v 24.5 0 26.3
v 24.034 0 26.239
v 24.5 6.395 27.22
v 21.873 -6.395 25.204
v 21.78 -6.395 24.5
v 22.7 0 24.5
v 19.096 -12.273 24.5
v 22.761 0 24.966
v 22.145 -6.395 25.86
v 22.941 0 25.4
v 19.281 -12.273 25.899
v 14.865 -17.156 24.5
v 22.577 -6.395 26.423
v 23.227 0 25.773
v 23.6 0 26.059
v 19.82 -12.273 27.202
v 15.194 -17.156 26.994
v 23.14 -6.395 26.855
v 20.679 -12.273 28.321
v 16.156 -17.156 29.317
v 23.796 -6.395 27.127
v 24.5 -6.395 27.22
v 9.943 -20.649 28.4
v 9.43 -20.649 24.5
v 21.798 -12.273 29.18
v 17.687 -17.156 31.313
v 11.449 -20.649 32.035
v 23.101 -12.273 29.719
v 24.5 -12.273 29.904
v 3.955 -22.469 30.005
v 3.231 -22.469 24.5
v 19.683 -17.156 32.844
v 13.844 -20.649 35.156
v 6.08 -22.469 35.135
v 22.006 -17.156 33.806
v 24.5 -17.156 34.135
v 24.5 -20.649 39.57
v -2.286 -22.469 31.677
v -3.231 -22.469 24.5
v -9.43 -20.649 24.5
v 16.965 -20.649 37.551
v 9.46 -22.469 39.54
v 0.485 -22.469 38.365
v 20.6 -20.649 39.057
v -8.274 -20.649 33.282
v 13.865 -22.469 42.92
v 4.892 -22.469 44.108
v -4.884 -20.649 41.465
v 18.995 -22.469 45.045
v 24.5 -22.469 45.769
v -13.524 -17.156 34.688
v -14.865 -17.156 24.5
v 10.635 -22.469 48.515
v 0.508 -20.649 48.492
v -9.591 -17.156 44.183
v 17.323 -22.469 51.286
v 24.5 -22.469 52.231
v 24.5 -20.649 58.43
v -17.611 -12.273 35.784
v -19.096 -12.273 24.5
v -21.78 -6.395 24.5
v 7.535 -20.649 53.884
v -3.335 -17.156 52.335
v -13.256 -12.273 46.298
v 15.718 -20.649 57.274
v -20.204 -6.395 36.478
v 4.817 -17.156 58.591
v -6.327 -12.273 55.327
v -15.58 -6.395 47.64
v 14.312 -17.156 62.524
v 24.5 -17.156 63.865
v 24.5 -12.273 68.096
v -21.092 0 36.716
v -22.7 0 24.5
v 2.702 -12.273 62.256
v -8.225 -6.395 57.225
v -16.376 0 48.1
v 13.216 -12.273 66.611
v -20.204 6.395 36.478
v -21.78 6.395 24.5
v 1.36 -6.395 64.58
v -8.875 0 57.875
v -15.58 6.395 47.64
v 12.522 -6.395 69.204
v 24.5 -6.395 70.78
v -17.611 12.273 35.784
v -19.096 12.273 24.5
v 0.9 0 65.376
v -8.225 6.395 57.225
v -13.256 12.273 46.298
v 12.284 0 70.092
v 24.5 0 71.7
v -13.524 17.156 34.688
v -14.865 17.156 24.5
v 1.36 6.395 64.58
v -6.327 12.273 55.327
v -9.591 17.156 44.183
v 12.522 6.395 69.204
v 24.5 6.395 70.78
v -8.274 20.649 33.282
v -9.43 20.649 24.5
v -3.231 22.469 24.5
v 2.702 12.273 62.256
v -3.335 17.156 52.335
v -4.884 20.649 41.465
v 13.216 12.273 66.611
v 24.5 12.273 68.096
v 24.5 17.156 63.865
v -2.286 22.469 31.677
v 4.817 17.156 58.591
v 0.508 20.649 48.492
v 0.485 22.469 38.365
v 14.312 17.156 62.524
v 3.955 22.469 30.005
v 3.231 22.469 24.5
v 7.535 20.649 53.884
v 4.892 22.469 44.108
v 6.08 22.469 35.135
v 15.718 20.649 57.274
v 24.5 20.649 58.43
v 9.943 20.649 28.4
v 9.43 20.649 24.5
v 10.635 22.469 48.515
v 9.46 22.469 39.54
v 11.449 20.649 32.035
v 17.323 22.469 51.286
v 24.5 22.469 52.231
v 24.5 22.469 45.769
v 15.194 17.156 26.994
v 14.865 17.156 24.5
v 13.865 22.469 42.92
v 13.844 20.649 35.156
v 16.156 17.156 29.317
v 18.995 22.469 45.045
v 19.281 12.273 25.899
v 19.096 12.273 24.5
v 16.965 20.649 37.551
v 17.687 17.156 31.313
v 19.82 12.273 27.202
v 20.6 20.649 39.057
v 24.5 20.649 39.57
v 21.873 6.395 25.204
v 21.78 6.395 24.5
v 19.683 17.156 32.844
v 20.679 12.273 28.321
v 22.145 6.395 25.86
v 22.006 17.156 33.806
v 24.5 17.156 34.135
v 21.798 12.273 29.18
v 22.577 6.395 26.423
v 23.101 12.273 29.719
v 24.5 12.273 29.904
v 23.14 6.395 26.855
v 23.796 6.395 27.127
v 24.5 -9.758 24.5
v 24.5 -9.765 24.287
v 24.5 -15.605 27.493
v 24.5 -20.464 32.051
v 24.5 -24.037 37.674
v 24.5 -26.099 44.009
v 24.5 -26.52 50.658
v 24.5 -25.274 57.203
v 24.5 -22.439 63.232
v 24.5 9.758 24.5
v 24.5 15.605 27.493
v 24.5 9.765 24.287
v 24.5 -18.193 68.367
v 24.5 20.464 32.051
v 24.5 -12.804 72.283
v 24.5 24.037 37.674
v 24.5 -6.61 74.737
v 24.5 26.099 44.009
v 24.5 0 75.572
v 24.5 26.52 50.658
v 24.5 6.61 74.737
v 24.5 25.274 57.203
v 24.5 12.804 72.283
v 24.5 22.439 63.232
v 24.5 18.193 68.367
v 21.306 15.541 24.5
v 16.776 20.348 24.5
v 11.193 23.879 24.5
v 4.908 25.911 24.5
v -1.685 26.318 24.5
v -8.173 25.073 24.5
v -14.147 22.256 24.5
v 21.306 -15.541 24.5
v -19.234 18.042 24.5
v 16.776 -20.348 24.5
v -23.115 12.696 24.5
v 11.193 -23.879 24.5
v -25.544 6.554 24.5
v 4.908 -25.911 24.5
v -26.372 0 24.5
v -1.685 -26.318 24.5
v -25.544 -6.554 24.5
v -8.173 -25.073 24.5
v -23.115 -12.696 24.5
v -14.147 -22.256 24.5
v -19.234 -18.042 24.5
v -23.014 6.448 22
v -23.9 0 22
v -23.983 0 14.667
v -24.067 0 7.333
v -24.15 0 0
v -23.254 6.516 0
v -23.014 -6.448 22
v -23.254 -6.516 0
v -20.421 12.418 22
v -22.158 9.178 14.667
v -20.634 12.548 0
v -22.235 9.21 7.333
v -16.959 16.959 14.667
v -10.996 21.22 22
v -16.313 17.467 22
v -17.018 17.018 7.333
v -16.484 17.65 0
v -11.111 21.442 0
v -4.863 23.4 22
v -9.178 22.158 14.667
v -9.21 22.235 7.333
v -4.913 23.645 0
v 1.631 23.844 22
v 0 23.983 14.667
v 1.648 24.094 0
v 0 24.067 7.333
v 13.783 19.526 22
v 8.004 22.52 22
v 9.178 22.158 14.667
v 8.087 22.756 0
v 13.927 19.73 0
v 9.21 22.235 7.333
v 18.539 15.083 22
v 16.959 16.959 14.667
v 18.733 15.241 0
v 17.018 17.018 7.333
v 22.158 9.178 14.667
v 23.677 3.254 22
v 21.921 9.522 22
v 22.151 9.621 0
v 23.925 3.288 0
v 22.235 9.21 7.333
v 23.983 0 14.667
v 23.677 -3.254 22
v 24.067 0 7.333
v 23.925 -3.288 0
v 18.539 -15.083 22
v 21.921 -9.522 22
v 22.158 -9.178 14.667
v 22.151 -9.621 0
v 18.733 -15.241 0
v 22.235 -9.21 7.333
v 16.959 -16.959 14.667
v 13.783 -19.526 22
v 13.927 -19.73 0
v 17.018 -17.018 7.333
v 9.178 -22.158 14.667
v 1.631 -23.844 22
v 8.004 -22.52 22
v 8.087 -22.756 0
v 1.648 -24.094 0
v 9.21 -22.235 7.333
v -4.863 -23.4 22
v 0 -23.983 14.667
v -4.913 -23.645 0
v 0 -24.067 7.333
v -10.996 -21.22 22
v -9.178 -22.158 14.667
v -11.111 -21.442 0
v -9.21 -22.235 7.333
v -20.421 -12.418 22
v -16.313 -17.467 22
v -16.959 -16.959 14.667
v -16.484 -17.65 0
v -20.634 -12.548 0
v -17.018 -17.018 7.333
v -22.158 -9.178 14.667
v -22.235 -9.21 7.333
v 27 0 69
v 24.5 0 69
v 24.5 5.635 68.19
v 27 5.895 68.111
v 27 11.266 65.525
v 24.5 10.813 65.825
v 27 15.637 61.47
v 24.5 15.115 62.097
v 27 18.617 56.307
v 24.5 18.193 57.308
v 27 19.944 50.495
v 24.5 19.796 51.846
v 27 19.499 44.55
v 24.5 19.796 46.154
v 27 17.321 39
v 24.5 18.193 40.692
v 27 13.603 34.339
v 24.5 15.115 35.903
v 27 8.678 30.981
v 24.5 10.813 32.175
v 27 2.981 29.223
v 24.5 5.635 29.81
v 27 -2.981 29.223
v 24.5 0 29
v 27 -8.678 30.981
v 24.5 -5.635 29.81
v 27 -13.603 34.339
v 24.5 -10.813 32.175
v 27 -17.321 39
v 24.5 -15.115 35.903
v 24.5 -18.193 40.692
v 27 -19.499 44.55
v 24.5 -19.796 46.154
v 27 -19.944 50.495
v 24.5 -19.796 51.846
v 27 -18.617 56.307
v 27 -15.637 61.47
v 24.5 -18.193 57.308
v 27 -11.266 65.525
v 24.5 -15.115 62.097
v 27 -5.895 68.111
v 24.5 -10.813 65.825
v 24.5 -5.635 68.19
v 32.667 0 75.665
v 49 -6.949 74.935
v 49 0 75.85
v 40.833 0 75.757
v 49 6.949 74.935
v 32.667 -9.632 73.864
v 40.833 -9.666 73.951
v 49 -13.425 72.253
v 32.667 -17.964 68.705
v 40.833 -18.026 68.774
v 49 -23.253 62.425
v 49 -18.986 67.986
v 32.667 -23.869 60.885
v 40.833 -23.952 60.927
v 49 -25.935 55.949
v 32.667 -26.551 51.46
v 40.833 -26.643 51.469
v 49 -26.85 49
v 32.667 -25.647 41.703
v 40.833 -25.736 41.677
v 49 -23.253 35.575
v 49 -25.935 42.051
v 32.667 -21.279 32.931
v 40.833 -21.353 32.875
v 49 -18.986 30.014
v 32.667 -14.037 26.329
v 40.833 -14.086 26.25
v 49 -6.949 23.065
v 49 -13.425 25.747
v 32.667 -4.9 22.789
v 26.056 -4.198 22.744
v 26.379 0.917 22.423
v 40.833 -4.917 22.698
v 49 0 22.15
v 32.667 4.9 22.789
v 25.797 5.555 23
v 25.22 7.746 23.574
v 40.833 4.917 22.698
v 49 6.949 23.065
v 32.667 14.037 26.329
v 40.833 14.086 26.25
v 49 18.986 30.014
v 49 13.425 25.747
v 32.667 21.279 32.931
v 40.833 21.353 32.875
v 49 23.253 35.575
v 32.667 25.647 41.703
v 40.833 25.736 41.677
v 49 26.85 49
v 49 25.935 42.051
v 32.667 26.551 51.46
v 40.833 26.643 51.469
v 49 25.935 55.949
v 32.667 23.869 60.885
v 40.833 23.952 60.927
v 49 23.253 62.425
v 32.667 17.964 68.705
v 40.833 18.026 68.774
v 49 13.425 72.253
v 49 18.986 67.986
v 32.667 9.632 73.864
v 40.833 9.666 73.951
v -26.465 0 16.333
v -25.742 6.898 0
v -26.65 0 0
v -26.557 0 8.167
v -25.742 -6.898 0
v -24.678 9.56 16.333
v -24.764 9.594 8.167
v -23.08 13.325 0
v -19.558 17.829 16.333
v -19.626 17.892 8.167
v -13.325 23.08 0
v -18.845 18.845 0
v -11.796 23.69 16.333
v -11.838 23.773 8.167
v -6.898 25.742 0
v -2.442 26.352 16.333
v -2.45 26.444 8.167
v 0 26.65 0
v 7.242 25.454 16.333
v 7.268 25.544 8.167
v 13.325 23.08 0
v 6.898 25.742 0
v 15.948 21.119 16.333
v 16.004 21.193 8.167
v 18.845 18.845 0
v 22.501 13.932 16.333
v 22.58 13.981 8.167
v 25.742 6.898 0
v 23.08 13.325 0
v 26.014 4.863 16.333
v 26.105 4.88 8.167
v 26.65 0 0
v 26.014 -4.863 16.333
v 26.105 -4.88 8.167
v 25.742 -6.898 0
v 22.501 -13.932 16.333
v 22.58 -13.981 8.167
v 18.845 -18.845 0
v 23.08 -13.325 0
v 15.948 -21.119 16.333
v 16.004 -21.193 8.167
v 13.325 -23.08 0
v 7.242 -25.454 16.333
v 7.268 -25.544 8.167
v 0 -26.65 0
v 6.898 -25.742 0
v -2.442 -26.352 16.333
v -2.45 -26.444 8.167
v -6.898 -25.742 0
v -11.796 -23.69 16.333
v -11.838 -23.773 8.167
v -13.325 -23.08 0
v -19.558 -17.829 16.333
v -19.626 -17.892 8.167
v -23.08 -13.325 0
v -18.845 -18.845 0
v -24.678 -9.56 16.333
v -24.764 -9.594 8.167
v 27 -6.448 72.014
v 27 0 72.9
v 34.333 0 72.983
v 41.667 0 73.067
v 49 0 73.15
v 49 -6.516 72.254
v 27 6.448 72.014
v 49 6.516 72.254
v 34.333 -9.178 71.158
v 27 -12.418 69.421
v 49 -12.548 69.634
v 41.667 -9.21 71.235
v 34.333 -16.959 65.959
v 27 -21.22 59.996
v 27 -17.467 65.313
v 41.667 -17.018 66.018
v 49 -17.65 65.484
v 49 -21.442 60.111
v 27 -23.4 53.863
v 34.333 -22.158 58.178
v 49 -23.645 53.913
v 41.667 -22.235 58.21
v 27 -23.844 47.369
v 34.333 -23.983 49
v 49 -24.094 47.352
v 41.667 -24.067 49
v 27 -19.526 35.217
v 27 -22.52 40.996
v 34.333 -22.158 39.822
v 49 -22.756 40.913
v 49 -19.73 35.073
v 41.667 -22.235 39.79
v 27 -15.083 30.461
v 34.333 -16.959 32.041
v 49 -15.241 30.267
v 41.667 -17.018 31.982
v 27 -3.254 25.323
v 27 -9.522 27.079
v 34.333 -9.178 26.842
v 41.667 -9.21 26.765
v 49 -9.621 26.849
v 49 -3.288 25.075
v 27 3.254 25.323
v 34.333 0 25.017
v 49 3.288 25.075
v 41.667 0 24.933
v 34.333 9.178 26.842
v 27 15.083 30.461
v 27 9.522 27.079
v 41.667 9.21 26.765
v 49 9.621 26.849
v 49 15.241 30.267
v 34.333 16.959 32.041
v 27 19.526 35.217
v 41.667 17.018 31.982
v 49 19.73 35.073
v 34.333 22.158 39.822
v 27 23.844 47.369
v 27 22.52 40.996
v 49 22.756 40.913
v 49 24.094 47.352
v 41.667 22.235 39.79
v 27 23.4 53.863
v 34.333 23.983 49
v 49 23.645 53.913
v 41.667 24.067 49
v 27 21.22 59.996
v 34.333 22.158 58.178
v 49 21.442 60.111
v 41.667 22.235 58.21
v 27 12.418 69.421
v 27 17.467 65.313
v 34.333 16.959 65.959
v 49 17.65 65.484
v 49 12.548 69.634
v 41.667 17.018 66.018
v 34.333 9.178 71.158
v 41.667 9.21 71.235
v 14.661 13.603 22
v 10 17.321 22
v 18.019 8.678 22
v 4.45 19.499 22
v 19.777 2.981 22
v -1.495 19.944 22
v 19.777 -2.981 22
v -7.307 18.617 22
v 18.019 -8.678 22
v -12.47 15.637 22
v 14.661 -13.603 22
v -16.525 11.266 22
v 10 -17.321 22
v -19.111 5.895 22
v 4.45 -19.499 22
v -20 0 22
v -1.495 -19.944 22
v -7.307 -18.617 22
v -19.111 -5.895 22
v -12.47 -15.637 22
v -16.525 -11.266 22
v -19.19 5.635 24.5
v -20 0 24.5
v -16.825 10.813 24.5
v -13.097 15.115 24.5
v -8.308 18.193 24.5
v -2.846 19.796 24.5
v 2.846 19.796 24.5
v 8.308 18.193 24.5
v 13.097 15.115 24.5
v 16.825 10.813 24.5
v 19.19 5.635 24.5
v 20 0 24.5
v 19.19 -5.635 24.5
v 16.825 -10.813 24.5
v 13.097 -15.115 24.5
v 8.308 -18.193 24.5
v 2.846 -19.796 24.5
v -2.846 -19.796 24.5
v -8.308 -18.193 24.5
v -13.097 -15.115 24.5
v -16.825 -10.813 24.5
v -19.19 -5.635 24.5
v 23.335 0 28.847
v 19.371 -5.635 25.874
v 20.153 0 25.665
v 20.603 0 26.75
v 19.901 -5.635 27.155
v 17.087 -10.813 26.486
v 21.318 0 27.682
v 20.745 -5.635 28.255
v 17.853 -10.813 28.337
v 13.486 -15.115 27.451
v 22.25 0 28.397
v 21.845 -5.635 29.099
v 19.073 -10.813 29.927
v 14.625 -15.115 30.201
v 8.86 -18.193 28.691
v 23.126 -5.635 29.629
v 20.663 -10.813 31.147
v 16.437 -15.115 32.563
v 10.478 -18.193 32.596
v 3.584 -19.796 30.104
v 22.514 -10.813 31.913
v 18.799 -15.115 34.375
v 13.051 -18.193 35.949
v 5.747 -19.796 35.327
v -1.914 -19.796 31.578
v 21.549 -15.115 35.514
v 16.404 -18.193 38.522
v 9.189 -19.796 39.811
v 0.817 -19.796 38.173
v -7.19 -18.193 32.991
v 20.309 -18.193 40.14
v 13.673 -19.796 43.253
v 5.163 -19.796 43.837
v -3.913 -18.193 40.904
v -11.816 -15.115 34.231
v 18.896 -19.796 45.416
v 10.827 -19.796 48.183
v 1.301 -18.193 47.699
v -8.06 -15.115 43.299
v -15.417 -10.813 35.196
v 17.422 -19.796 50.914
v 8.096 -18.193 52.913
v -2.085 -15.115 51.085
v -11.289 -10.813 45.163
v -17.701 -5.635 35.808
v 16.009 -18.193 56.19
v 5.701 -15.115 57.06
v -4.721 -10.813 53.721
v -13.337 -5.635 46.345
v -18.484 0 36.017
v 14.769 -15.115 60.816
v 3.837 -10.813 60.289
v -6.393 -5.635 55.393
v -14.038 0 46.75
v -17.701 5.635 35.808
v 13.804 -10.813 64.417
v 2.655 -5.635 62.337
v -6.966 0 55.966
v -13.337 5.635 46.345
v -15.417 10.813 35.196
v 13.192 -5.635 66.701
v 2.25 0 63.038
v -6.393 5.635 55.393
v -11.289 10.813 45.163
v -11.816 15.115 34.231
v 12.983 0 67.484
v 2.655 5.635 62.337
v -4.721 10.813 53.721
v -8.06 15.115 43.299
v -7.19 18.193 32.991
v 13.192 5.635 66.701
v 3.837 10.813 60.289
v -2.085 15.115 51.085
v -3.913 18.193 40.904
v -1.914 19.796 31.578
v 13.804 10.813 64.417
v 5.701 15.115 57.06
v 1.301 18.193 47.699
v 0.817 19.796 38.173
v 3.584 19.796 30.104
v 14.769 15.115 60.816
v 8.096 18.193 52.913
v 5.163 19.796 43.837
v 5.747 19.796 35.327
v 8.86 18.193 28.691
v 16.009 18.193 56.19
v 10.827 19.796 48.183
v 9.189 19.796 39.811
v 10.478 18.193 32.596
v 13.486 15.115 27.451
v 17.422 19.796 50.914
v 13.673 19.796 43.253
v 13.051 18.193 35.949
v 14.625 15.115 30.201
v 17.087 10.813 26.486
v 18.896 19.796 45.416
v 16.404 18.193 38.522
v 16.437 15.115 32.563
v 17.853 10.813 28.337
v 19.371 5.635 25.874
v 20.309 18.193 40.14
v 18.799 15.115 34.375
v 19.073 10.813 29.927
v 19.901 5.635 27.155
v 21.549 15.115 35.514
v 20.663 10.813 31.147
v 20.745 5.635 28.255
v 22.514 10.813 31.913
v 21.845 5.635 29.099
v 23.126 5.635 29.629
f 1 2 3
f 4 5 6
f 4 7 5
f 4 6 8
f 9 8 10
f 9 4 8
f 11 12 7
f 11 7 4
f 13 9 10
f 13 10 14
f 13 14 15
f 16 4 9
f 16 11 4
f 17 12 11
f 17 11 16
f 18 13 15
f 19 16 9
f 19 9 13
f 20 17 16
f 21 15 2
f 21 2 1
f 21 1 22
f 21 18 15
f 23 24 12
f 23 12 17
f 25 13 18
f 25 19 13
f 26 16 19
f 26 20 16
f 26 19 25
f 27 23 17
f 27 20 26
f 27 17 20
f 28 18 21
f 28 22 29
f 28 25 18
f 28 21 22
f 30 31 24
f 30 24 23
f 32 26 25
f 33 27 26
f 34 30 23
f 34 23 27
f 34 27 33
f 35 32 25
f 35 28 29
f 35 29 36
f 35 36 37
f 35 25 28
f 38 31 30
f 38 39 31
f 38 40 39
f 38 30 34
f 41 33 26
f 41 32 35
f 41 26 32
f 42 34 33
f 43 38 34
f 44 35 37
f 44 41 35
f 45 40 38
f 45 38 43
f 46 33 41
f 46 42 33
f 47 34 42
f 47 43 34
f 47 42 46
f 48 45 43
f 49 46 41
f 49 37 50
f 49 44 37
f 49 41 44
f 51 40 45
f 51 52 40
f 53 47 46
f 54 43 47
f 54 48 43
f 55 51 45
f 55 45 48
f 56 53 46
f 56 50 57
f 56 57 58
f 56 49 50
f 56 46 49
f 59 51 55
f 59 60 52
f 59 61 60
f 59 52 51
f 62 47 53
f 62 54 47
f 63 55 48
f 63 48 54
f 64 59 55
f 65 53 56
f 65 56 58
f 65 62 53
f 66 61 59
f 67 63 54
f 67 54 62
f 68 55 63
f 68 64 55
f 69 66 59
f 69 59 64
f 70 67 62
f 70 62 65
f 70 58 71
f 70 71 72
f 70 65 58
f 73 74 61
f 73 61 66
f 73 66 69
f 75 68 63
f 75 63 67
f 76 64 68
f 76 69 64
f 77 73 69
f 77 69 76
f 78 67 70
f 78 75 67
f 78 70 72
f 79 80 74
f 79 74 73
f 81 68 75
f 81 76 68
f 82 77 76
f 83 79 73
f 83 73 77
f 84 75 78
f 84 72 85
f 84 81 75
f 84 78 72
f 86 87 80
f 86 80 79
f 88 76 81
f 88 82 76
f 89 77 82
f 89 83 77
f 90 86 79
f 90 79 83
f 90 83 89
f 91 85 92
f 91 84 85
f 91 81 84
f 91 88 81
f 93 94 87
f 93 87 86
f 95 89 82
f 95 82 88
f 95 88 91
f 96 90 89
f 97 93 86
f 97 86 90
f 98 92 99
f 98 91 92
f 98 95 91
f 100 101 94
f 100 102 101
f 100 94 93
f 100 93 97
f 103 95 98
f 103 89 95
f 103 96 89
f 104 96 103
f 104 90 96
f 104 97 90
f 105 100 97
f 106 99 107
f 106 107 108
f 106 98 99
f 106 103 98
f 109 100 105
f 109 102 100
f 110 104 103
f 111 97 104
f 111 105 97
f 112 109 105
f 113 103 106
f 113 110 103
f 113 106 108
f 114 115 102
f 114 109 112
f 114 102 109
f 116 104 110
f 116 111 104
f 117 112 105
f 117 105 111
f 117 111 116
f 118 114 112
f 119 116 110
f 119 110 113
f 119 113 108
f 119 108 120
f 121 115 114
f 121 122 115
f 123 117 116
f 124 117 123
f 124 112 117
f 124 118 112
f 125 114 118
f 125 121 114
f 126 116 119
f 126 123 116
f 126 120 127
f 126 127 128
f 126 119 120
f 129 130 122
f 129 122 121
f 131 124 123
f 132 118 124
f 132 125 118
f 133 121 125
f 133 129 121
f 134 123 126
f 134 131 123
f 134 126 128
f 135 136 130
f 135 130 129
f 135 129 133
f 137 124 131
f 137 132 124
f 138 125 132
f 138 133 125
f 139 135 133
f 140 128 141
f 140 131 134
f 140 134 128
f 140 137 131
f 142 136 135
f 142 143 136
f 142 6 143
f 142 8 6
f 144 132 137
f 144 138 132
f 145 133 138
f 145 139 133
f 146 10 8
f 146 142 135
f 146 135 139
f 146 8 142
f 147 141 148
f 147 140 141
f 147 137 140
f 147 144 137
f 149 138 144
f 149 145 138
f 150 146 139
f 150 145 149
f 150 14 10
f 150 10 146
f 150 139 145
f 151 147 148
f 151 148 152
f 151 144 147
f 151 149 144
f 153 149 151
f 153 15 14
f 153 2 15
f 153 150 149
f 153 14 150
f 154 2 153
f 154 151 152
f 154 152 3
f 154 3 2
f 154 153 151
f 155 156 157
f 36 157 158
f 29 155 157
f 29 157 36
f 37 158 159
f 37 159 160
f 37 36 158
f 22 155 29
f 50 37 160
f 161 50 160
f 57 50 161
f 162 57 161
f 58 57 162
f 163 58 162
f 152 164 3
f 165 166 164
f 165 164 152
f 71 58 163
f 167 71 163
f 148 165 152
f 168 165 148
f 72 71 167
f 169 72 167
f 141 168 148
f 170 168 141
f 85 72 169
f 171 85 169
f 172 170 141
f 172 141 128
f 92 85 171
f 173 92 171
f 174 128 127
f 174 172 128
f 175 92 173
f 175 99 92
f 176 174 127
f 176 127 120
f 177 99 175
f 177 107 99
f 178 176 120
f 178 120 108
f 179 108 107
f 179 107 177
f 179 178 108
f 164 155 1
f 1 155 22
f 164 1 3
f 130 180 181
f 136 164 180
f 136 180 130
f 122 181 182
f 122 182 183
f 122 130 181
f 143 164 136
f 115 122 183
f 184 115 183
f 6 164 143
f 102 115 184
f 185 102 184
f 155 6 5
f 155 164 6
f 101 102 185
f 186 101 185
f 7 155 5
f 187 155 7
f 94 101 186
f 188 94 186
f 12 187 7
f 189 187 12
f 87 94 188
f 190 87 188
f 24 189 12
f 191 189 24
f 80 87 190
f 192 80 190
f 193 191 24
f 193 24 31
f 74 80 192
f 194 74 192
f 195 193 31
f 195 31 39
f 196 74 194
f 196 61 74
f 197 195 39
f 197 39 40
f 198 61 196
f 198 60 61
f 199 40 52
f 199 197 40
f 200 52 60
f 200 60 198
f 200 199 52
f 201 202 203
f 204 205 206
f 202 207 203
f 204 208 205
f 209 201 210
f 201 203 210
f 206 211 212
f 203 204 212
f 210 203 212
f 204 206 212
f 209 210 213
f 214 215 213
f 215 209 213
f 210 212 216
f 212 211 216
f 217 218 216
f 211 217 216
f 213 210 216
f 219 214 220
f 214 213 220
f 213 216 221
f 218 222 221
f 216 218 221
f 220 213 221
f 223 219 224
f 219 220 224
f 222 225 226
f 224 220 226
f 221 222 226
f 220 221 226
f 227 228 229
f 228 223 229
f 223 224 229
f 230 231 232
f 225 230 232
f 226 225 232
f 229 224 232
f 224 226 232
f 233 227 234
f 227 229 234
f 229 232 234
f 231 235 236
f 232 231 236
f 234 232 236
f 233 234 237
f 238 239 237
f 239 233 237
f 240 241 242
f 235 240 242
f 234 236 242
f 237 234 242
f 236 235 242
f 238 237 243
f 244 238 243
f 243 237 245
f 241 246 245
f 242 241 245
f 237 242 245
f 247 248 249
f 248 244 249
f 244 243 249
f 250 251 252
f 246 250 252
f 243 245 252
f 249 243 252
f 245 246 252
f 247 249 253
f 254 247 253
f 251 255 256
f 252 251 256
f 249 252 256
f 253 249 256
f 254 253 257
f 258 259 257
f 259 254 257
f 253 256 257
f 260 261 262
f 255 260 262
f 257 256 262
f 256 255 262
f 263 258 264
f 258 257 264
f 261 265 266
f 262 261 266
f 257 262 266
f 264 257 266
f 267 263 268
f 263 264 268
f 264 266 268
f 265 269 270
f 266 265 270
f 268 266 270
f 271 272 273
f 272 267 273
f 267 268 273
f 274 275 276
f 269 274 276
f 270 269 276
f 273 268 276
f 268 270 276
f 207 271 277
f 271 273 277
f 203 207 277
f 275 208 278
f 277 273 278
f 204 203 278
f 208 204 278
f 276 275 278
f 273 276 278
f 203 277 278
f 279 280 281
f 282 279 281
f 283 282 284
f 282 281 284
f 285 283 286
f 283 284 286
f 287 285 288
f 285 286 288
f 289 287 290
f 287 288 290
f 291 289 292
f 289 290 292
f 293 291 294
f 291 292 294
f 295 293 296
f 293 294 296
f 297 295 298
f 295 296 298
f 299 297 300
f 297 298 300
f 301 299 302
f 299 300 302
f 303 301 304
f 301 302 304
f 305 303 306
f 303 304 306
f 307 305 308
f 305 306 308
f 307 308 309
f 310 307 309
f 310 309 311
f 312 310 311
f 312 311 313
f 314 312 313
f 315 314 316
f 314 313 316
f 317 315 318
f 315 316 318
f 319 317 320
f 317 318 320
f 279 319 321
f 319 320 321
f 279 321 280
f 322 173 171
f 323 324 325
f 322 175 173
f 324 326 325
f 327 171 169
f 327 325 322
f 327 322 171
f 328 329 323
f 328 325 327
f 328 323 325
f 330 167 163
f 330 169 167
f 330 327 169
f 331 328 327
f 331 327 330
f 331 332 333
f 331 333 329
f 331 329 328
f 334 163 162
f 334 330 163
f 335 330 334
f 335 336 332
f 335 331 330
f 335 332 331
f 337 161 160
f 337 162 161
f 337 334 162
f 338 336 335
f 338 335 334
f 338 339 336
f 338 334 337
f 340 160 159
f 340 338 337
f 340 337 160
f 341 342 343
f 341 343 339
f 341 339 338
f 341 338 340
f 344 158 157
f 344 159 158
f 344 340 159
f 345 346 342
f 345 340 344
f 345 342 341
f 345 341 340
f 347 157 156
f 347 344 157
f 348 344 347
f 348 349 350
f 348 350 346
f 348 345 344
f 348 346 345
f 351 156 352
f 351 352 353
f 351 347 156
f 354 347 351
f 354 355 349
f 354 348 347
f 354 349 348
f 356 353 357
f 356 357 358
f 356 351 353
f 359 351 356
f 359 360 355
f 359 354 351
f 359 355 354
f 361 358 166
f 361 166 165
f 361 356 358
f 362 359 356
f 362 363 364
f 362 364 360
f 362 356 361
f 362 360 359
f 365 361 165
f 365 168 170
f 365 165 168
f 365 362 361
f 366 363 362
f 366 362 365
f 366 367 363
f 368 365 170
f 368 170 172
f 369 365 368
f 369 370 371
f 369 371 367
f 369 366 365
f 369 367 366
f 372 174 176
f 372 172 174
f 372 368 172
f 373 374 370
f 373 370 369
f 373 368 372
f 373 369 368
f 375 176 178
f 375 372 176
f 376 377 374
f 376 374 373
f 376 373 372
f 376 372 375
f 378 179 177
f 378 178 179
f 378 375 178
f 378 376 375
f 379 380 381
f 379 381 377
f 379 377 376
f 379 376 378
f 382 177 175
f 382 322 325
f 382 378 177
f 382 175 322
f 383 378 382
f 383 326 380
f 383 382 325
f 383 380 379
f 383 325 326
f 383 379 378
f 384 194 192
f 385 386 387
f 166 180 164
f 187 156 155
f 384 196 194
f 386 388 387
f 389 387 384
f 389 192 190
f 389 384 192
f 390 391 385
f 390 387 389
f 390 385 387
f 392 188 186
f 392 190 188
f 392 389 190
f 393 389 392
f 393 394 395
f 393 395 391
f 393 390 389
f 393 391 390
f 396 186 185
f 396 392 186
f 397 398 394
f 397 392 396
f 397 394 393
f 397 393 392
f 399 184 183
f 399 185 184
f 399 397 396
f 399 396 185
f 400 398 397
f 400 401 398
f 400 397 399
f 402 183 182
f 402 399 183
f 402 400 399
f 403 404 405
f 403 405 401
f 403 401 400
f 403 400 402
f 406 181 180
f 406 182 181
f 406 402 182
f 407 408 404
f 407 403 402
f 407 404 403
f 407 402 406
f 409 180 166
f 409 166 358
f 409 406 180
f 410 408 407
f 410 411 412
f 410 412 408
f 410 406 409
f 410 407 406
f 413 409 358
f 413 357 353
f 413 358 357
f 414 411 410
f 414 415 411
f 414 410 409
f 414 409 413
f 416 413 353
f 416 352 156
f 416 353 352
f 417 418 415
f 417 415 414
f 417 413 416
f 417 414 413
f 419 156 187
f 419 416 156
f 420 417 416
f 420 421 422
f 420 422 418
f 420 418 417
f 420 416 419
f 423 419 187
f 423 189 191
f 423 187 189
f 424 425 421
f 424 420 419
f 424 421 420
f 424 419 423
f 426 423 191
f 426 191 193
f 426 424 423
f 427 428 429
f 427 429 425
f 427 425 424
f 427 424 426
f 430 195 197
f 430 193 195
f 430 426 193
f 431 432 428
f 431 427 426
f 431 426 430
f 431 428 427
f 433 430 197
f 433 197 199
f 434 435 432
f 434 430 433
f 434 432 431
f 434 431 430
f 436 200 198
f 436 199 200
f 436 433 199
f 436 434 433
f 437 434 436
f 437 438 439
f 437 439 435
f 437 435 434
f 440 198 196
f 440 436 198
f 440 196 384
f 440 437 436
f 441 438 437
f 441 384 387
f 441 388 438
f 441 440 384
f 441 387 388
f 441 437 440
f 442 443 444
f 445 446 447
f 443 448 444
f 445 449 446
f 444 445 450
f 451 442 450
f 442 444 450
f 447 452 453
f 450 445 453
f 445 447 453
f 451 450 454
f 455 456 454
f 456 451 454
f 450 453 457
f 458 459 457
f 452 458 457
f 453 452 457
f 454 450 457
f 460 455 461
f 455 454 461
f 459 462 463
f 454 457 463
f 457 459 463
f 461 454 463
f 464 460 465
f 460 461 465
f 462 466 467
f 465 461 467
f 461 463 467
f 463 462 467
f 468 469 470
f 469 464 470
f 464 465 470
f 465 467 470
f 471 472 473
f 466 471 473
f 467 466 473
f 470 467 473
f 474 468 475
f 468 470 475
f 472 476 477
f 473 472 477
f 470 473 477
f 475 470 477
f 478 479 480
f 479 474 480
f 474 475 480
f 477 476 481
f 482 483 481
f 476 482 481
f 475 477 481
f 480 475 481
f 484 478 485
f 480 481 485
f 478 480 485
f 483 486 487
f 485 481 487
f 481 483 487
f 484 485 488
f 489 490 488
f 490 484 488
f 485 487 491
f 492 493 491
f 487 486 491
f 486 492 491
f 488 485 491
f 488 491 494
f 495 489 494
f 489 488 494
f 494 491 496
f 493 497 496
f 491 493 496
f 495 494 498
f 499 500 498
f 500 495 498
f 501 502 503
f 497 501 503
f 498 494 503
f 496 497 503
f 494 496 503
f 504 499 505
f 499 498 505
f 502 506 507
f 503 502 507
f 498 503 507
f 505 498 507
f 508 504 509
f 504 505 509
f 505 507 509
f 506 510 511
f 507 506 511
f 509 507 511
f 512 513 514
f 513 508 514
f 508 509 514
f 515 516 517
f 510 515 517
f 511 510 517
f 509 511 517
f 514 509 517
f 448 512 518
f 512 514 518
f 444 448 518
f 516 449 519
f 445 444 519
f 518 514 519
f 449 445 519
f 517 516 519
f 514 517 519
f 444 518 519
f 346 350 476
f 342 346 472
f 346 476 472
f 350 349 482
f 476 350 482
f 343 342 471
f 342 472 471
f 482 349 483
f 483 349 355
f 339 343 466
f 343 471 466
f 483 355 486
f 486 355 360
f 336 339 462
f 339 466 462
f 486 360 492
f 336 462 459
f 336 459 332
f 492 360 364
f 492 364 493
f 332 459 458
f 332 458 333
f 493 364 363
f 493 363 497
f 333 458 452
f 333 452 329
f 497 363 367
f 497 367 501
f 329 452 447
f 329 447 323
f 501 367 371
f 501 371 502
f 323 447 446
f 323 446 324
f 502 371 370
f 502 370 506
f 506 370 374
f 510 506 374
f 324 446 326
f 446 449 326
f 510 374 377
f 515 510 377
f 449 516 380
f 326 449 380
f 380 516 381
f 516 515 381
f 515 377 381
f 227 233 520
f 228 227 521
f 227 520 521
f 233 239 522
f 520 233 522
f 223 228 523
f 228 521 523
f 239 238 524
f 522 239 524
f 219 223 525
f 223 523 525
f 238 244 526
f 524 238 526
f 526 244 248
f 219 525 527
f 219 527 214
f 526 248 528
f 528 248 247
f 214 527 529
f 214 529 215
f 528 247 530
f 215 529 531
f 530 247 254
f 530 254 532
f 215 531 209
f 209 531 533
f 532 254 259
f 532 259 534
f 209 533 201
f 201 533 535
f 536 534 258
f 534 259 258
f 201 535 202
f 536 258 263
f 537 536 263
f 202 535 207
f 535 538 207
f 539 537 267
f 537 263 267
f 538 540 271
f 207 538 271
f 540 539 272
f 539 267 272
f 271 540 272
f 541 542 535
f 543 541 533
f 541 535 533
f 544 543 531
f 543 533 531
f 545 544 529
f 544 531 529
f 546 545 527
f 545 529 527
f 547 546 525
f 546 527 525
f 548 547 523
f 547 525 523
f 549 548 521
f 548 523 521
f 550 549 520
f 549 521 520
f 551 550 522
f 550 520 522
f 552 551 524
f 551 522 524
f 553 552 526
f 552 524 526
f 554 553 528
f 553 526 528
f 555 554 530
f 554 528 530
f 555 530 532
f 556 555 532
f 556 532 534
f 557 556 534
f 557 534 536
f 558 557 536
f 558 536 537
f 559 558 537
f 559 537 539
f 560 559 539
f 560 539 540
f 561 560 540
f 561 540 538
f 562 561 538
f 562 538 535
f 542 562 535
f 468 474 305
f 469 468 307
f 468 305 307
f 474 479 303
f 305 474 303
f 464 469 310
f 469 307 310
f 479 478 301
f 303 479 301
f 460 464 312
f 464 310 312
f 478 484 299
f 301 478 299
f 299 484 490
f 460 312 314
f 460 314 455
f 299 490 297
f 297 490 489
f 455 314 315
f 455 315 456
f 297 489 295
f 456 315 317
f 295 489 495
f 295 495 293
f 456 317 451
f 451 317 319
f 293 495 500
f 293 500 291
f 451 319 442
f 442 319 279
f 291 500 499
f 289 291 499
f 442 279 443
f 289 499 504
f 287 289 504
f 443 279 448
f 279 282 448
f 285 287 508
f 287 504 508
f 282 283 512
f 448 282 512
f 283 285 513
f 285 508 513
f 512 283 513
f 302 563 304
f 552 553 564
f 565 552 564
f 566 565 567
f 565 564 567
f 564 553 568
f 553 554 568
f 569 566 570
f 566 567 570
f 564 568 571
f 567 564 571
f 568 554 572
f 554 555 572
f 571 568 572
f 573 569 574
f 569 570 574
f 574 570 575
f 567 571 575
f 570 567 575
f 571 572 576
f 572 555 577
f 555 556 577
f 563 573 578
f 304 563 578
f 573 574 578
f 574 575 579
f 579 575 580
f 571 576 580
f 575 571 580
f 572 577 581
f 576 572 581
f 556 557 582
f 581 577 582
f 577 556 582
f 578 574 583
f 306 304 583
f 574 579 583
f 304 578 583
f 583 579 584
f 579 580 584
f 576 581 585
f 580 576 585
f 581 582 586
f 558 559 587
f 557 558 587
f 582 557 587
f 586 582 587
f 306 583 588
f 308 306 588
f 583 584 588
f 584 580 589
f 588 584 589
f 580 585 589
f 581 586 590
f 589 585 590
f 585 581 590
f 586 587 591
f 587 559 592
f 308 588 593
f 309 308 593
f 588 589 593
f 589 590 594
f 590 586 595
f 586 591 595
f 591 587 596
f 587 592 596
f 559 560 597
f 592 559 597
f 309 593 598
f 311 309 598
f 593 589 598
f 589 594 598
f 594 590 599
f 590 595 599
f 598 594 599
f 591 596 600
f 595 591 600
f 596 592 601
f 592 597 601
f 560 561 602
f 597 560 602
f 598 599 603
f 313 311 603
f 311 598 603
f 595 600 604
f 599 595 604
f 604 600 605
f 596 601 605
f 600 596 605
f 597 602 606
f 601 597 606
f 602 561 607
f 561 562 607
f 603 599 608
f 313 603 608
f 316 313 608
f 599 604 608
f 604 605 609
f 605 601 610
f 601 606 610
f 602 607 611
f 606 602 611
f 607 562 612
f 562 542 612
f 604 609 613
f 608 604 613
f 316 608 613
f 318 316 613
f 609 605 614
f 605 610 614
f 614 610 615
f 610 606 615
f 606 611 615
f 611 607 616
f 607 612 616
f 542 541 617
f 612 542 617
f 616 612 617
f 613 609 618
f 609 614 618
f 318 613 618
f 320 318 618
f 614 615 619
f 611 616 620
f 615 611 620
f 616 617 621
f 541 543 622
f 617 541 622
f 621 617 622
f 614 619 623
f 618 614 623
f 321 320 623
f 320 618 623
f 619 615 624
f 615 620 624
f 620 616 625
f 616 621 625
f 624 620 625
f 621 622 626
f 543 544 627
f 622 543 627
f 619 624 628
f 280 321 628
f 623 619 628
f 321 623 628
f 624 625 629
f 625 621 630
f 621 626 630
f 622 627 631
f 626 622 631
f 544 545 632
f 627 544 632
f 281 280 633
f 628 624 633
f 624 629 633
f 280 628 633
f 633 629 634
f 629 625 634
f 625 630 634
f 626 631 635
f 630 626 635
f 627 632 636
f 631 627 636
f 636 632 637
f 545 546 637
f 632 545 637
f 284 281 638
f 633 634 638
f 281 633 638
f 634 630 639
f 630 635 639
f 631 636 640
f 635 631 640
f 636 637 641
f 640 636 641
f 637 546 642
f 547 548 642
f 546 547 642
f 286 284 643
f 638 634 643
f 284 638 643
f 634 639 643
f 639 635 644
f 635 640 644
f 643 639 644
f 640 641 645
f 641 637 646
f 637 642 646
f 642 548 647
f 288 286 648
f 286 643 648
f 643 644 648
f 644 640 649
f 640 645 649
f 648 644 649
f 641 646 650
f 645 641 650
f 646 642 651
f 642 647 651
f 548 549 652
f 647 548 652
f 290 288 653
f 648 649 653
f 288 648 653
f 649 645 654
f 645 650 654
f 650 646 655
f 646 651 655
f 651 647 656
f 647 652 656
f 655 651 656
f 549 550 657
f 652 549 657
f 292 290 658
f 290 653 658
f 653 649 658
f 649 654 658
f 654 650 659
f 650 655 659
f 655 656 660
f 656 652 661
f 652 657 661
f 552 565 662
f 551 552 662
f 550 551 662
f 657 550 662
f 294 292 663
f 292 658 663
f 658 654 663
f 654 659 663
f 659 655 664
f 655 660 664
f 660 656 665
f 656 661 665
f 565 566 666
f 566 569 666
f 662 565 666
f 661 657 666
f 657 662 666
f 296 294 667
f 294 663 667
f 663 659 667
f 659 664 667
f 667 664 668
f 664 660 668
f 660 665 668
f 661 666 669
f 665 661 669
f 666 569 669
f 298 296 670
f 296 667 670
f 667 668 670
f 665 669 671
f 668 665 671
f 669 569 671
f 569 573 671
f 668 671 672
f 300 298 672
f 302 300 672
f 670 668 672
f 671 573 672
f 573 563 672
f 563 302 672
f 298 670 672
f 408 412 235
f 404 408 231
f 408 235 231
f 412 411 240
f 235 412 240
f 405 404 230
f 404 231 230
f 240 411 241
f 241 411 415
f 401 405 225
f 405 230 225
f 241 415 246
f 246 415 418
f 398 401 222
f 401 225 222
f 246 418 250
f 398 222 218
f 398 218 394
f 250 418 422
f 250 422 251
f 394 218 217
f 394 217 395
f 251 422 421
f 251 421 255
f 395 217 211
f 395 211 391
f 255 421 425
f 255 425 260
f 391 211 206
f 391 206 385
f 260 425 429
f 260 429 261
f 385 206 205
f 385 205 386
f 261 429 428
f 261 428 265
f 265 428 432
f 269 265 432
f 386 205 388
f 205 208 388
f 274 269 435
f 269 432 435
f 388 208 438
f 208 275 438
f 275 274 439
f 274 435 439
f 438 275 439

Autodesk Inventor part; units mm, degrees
ref_plane "YZ Plane" through (0, 0, 0) normal (1, 0, 0) x (0, 1, 0)
ref_plane "XZ Plane" through (0, 0, 0) normal (0, 1, 0) x (-1, 0, 0)
ref_plane "XY Plane" through (0, 0, 0) normal (0, 0, 1) x (1, 0, 0)
sketch "Sketch1" plane through (0, 0, 0) normal (0, 1, 0) x (-1, 0, 0)
  line L0 (0, 0) -> (0, 24.5)
  line L1 (26.6502, 0) -> (0, 0)
  line L2 (0, 24.5) -> (26.3718, 24.5)
  line L3 (23.9, 22) -> (24.15, 0)
  line L4 (26.6502, 0) -> (26.3718, 24.5)
  line L5 (20, 24.5) -> (20, 22)
  line L6 (20, 22) -> (23.9, 22)
  line L7 (20, 22) -> (0, 22) construction
  dimension "d0" = 48.3
  dimension "d3" = 47.8
  dimension "d4" = 2.5
  dimension "d5" = 22
  dimension "d6" = 2.5
  dimension "d7" = 40
revolve "Revolution1" add sketch "Sketch1" angle 360 about axis through (0, 0, 0) along (0, 0, 1) contours L3 L6 L5 L2 L4 L1
sketch "Sketch2" plane through (0, 0, 24.5) normal (0, 0, 1) x (1, 0, 0)
  circle A0 centre (0, 0) radius 26.3718 projected
  circle A1 centre (0, 0) radius 20 projected
  circle A2 centre (0, 0) radius 22.7
  circle A3 centre (0, 0) radius 20
  dimension "d8" = 40
  dimension "d9" = 2.7
sketch "Sketch3" plane through (0, 0, 0) normal (0, 1, 0) x (-1, 0, 0)
  arc A0 (0, 24.5) -> (-24.5, 49) centre (-24.5, 24.5) ccw
  dimension "d10" = 24.5
  dimension "d11" = 24.5
  dimension "d12" = 24.5
sweep "Sweep1" add profiles "Sketch2" path "Sketch3" contours A2
sketch "Sketch4" plane through (0, 0, 0) normal (0, 1, 0) x (-1, 0, 0)
  line L0 (-24.5, 29) -> (-24.5, 69) projected
  line L1 (-49, 49) -> (-24.5, 49)
  line L2 (-24.5, 49) -> (-24.5, 75.5718)
  line L3 (-24.5, 75.5718) -> (-49, 75.8502)
  line L4 (-49, 75.8502) -> (-49, 49)
  line L5 (-49, 73.15) -> (-27, 72.9)
  line L6 (-27, 75.6002) -> (-27, 69)
  line L7 (-27, 69) -> (-24.5, 69)
  line L8 (-27, 69) -> (-27, 49) construction
  dimension "d14" = 2.7
  dimension "d15" = 22
  dimension "d16" = 2.5
  dimension "d17" = 48.3
  dimension "d18" = 47.8
  dimension "d19" = 40
revolve "Revolution2" add sketch "Sketch4" angle 360 about axis through (49, 0, 49) along (-1, 0, 0) contours L7 L6 L3 L2 | L4 L3 L6 L5
equation "\"d0\" = d1"
equation "\"d3\" = d2"
equation "\"d4\" = t2"
equation "\"d5\" = l1"
equation "\"d6\" = t2"
equation "\"d7\" = d"
equation "\"d8\" = d"
equation "\"d9\" = t1"
equation "\"d10\" = Z - t2"
equation "\"d11\" = Z - t2"
equation "\"d12\" = Z - t2"
equation "\"d14\" = t1"
equation "\"d15\" = l1"
equation "\"d16\" = t2"
equation "\"d17\" = d1"
equation "\"d18\" = d2"
equation "\"d19\" = d"
equation "\"d\" = 40"
equation "\"d1\" = 48.3"
equation "\"d2\" = 47.8"
equation "\"l1\" = 22"
equation "\"L\" = 49"
equation "\"t1\" = 2.7"
equation "\"t2\" = 2.5"
equation "\"Z\" = 27"
properties part number "JIS K 6739 90 Deg Elbow (DL) 40" material "PVC, Unplasticized"
